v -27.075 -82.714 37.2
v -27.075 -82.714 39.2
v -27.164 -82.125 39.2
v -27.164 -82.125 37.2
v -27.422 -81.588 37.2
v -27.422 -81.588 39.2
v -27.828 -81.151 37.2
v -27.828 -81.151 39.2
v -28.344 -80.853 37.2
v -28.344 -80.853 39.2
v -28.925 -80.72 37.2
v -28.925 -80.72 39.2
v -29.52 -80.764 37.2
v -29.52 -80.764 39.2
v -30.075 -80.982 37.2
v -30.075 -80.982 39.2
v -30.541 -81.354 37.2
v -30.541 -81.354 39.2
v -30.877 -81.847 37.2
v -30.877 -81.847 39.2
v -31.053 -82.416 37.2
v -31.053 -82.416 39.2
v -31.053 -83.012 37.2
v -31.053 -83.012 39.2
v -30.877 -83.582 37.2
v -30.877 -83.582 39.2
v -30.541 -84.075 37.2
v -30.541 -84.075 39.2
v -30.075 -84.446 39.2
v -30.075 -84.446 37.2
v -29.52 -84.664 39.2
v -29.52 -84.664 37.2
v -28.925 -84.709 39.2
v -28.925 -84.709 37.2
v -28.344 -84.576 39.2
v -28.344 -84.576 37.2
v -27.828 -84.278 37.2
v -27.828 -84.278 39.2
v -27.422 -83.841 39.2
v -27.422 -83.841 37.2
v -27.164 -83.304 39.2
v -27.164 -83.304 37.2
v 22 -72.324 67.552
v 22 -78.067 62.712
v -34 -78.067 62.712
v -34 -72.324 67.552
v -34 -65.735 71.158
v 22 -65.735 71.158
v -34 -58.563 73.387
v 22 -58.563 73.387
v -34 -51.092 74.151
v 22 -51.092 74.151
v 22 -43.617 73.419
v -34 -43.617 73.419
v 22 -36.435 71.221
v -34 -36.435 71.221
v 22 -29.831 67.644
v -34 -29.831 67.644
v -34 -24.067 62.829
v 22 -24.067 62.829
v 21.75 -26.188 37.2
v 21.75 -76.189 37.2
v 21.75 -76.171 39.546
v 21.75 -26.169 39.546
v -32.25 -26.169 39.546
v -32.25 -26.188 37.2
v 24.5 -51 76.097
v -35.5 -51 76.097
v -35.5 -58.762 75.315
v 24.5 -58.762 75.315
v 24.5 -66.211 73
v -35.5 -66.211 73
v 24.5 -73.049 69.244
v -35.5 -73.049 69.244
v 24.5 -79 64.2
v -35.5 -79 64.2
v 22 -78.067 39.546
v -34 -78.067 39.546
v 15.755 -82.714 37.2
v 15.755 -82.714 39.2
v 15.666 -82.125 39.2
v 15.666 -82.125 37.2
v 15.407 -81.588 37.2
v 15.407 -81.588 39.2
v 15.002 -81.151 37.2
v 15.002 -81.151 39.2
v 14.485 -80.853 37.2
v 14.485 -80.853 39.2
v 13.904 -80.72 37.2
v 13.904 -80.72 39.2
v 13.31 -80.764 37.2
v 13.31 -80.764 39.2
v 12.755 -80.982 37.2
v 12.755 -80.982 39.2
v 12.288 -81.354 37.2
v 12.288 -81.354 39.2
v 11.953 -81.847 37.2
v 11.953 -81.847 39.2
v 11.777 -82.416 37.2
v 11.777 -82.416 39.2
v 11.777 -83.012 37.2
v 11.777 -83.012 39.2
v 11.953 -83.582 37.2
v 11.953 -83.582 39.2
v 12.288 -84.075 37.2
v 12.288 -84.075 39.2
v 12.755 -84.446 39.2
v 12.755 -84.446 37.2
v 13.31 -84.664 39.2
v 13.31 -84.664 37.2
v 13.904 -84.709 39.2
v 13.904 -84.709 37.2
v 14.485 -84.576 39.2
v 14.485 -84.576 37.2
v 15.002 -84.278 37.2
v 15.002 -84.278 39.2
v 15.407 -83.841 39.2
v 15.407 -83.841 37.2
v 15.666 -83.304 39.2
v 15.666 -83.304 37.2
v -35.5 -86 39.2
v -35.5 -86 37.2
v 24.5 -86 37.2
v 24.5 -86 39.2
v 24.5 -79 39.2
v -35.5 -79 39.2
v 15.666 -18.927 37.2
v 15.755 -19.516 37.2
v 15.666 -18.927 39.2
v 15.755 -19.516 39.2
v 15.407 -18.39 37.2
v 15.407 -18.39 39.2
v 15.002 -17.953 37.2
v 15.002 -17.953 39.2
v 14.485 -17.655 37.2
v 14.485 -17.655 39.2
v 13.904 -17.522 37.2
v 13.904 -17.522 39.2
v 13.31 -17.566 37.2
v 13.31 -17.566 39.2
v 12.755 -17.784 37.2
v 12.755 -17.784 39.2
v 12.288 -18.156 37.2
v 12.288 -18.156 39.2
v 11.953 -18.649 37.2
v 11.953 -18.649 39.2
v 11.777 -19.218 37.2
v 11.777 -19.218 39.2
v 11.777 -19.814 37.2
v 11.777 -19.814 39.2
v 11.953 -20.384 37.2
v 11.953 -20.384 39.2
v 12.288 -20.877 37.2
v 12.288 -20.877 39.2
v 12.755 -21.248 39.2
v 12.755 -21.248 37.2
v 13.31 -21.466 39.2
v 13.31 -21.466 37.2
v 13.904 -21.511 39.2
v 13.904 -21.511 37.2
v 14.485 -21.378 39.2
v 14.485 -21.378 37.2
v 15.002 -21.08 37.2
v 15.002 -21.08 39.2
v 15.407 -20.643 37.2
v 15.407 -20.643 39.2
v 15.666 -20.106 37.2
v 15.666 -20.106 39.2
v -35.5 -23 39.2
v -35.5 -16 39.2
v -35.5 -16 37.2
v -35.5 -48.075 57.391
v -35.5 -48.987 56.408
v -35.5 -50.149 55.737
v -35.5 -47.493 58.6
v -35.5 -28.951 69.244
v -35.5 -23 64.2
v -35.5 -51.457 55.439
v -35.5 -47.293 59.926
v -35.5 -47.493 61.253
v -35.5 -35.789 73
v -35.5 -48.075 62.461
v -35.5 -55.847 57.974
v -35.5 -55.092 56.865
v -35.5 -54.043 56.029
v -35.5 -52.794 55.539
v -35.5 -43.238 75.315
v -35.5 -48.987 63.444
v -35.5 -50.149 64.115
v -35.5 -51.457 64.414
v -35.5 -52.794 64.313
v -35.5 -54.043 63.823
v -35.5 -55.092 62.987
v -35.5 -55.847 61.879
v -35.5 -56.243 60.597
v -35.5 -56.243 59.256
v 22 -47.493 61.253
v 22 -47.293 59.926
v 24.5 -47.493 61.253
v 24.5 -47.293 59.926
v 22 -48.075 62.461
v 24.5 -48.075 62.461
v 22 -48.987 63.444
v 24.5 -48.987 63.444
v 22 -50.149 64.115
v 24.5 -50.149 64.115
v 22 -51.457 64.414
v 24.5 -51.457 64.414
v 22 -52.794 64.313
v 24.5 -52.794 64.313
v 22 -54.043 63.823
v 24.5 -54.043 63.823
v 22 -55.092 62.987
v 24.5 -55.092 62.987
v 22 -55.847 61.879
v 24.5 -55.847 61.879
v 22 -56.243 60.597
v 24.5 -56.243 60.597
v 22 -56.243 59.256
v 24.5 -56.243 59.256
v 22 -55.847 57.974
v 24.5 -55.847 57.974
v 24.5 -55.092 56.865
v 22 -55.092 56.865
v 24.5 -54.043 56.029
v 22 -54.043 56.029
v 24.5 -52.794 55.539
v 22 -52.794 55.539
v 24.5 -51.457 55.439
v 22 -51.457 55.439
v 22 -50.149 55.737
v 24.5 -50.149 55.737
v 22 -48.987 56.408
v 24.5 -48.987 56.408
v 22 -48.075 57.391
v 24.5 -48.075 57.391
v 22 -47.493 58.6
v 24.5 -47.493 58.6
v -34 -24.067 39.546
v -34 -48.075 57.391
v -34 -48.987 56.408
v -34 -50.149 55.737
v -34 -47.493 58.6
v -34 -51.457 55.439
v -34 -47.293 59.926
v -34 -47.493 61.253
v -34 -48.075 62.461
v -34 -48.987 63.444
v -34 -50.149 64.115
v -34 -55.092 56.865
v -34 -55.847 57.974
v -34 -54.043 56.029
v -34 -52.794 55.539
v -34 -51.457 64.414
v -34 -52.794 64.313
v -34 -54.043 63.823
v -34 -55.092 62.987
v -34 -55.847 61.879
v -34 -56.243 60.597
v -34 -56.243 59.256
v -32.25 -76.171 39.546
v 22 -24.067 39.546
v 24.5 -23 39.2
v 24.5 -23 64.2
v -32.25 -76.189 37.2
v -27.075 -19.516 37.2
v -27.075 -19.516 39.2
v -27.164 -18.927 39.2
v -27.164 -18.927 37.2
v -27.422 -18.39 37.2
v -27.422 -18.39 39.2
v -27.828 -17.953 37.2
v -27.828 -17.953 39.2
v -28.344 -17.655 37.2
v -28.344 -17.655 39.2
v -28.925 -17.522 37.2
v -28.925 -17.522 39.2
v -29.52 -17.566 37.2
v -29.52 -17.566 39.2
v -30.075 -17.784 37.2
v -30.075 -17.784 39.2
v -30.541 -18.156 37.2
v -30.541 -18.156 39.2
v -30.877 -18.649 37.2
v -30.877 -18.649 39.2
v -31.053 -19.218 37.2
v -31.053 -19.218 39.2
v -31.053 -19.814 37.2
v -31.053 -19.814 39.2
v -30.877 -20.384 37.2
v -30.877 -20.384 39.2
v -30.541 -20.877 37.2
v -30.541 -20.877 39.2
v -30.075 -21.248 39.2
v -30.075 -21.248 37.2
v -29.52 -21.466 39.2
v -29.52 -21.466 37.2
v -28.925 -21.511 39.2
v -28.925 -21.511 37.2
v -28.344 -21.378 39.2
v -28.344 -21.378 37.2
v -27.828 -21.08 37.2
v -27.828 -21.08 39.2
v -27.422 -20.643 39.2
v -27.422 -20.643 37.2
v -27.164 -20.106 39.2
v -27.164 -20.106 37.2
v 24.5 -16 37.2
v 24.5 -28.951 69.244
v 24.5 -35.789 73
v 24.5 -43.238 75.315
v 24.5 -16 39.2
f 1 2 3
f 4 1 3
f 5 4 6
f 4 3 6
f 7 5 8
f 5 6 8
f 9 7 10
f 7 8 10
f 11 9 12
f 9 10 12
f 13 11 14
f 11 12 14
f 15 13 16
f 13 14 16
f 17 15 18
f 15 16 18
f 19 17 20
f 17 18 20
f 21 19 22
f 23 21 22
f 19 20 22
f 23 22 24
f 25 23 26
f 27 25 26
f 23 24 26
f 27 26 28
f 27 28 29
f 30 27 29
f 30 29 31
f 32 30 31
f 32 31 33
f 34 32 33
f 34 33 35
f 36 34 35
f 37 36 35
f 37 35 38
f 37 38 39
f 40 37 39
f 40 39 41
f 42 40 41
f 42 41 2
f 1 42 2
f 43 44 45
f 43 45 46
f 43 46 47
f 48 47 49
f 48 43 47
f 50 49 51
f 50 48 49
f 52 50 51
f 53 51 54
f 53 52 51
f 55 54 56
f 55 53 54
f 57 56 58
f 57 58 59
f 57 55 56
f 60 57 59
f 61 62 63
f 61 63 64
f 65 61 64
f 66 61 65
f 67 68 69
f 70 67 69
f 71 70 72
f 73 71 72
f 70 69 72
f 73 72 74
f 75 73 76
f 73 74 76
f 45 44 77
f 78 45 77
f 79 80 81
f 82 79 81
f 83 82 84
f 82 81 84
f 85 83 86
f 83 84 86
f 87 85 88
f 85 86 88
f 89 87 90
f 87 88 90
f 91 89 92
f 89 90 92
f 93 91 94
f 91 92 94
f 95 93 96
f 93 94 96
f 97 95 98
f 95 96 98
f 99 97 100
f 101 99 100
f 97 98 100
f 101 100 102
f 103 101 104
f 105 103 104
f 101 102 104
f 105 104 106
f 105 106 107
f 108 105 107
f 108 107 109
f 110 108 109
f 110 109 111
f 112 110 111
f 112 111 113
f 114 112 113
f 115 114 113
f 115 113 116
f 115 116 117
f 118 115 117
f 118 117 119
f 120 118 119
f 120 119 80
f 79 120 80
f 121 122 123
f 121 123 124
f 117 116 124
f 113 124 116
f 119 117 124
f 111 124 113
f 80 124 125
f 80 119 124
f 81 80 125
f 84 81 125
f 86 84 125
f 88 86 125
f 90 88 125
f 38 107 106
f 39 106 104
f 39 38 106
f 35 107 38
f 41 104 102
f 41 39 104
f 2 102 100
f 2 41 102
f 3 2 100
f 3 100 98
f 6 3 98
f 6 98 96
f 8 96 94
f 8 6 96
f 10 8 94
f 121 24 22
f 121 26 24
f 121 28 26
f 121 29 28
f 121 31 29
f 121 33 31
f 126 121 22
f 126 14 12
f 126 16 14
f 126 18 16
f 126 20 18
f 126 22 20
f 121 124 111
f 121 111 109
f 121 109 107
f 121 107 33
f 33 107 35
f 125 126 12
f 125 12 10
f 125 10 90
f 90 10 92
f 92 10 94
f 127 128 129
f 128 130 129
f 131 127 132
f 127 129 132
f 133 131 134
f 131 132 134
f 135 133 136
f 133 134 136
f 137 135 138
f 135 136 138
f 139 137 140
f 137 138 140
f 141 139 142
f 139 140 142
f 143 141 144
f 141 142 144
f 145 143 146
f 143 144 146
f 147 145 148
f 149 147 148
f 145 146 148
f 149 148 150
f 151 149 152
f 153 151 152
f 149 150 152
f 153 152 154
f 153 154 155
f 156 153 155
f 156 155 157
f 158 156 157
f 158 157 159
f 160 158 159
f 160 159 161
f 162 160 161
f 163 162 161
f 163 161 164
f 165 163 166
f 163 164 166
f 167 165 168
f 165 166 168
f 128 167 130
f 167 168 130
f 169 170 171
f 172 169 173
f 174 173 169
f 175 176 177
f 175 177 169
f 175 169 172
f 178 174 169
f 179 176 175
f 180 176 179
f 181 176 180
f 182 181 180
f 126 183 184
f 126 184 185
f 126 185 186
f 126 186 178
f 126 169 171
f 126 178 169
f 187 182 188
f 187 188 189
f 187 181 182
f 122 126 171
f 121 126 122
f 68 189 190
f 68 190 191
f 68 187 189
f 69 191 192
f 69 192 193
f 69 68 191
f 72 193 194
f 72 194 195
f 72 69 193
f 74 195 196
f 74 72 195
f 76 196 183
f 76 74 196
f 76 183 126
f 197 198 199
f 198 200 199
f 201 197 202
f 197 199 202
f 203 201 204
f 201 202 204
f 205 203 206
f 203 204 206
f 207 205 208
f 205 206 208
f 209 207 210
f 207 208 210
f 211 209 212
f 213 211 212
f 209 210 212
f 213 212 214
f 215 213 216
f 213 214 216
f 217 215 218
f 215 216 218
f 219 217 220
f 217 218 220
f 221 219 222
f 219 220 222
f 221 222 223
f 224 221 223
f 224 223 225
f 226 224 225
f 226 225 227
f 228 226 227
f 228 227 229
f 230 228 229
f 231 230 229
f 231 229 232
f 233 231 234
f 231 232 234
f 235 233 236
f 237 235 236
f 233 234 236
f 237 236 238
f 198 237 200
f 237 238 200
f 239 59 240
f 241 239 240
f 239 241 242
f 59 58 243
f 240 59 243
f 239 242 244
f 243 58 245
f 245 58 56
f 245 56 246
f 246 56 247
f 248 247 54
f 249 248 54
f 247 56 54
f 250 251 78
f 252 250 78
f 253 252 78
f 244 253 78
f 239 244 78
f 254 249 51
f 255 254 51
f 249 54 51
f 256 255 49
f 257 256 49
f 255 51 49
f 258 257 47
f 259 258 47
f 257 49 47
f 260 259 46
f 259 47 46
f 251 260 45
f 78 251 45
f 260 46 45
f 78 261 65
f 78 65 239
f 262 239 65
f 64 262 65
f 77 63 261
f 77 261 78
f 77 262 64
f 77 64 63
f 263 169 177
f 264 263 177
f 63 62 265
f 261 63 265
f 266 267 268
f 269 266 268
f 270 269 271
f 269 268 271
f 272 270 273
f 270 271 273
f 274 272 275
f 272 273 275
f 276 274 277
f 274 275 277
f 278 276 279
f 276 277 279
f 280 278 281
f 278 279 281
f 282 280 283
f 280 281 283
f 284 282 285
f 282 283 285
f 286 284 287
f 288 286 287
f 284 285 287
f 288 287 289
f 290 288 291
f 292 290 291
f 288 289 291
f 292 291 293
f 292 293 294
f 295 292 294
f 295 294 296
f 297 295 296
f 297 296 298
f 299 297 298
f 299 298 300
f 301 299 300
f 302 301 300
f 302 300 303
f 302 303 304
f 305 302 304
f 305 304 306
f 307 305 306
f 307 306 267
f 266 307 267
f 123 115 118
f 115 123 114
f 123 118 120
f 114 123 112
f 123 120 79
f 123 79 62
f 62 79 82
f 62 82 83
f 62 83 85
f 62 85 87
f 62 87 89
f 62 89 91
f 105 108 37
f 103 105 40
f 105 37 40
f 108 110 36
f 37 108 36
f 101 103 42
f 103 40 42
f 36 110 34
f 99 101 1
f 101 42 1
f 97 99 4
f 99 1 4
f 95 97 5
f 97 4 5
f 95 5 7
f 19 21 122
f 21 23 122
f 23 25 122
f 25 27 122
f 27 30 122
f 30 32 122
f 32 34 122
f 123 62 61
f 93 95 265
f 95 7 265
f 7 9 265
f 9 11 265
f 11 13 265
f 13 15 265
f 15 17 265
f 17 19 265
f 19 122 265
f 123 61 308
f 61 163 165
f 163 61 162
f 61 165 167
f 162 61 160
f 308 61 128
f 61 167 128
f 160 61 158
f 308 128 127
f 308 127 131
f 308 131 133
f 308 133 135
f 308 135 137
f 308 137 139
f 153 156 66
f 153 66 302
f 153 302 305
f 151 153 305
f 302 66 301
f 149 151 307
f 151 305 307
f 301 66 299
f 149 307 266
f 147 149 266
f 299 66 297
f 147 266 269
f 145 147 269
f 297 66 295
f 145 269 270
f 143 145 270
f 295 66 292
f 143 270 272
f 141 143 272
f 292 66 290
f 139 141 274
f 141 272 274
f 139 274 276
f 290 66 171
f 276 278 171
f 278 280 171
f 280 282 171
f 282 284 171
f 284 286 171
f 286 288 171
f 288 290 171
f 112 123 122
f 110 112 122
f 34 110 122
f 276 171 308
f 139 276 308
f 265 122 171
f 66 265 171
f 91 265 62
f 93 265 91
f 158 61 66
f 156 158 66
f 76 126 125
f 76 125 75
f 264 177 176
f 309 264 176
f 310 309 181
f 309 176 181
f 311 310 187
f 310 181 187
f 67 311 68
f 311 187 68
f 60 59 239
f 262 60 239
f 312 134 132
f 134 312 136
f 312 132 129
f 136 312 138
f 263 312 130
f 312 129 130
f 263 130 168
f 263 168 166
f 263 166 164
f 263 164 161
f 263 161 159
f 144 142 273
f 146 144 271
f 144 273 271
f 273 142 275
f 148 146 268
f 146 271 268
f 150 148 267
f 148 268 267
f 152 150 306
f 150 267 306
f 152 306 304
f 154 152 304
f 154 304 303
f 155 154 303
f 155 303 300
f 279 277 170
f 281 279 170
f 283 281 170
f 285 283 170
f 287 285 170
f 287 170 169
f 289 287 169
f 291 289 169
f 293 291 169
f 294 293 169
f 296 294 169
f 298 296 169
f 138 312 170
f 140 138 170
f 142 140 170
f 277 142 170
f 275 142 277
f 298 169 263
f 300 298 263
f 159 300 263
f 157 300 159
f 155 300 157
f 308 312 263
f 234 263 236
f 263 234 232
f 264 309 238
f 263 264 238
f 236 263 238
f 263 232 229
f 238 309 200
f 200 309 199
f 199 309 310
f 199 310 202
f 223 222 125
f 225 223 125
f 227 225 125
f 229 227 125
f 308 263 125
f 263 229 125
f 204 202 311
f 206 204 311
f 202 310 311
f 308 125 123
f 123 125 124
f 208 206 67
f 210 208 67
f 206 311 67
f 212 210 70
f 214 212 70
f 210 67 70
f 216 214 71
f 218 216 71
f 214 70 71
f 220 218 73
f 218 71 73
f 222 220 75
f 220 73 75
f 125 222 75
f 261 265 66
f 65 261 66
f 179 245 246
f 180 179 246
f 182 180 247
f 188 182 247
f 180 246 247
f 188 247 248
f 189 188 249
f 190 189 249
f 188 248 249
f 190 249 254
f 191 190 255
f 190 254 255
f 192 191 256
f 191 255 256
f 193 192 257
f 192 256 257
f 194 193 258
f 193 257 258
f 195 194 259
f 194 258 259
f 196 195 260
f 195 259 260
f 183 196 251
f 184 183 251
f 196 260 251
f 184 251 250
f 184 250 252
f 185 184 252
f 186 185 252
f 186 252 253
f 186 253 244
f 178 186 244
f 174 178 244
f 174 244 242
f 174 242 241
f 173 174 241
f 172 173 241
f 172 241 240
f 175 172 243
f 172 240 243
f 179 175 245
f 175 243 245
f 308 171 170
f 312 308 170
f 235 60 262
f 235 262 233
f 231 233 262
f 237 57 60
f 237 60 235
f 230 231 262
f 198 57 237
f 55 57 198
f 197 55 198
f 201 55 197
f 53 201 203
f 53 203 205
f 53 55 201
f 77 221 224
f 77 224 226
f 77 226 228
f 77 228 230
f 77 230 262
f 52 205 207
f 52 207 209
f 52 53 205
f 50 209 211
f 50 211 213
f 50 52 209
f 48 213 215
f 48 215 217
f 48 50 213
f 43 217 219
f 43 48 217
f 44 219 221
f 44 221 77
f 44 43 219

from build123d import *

# Parameters (mm, degrees)
EXTRUDE051_DEPTH                          = 56
SKETCH049_R                               = 2
EXTRUDE049_DEPTH                          = 15
SKETCH048_R                               = 4.5
EXTRUDE048_DEPTH                          = 100
SKETCH046_AS_DRAWN_W                      = 50
SKETCH046_AS_DRAWN_H                      = 54
EXTRUDE046_DEPTH                          = 24
EXTRUDE046_ONTO_SKETCH046_PITCH_ANGLE     = 0.457086
EXTRUDE046_ONTO_SKETCH046_PLACEMENT_ANGLE = 90
EXTRUDE045_DEPTH                          = 60


with BuildPart() as block_hollower:
    # Sketch050 (on Face1 of Cut026) → Extrude051 (new body)
    with BuildSketch(Plane(origin=(-35.5, 0, 0), x_dir=(0, -1, 0), z_dir=(-1, 0, 0))):
        with BuildLine():
            Line((24.067108, 62.828769), (24.067108, 39.546181))
            Line((24.067108, 39.546181), (78.067085, 39.546181))
            Line((78.067085, 62.712322), (78.067085, 39.546181))
            ThreePointArc((78.067085, 62.712322), (51.091637, 74.150565), (24.067108, 62.828769))
        make_face()
    extrude(amount=EXTRUDE051_DEPTH)


with BuildPart() as block_hollower_1:
    # Extrude051 placement: moved
    add(block_hollower.part.moved(Location((57.5, 0, 0))))


with BuildPart() as weapon_cover_screw_holes:
    # Sketch049 (on Face6 of Cut025) → Extrude049 (new body, symmetric)
    with BuildSketch(Plane.XY.offset(39.2)):
        with Locations((-29.074951, -82.714325)):
            Circle(SKETCH049_R)
        with Locations((13.75458, -82.714325)):
            Circle(SKETCH049_R)
        with Locations((-29.074951, -19.516283)):
            Circle(SKETCH049_R)
        with Locations((13.75458, -19.516283)):
            Circle(SKETCH049_R)
    extrude(amount=EXTRUDE049_DEPTH, both=True)


with BuildPart() as axis_hole_lid:
    # Sketch048 (on Face3 of Cut024) → Extrude048 (new body, symmetric)
    with BuildSketch(Plane.YZ.offset(24.5)):
        with Locations((-51.79294, 59.926255)):
            Circle(SKETCH048_R)
    extrude(amount=EXTRUDE048_DEPTH, both=True)


with BuildPart() as semi_hollower:
    # Sketch046 as drawn → Extrude046 (new)
    with BuildSketch(Plane.XY):
        with Locations((-9, -1)):
            Rectangle(SKETCH046_AS_DRAWN_W, SKETCH046_AS_DRAWN_H)
    extrude(amount=EXTRUDE046_DEPTH)


with BuildPart() as semi_hollower_1:
    # Extrude046 onto Sketch046 pitch: moved
    add(semi_hollower.part.rotate(Axis((0, 0, 0), (0, 1, 0)), EXTRUDE046_ONTO_SKETCH046_PITCH_ANGLE))


with BuildPart() as semi_hollower_2:
    # Extrude046 onto Sketch046 placement: moved
    add(semi_hollower_1.part.moved(Location((-5.5, -69.445946, 37.254054))).rotate(Axis((-5.5, -69.445946, 37.254054), (0, 0, 1)), EXTRUDE046_ONTO_SKETCH046_PLACEMENT_ANGLE))


with BuildPart() as semi_hollower_3:
    # Extrude046 placement: moved
    add(semi_hollower_2.part.moved(Location((-0.75, 27.25, -1))))


with BuildPart() as weapon_gear_cover:
    # Sketch045 → Extrude045 (new body)
    with BuildSketch(Plane.YZ):
        with BuildLine():
            Line((-86, 37.2), (-86, 39.2))
            Line((-86, 39.2), (-79, 39.2))
            Line((-79, 39.2), (-79, 64.2))
            ThreePointArc((-51, 76.097301), (-66.211392, 72.999631), (-79, 64.2))
            ThreePointArc((-23, 64.2), (-35.788608, 72.999631), (-51, 76.097301))
            Line((-23, 39.2), (-23, 64.2))
            Line((-16, 39.2), (-23, 39.2))
            Line((-16, 37.2), (-16, 39.2))
            Line((-16, 37.2), (-51, 37.2))
            Line((-86, 37.2), (-51, 37.2))
        make_face()
    extrude(amount=EXTRUDE045_DEPTH)


with BuildPart() as weapon_gear_cover_1:
    # Extrude045 placement: moved
    add(weapon_gear_cover.part.moved(Location((-35.5, 0, 0))))

    # Cut024: cut Semi Hollower
    add(semi_hollower_3.part, mode=Mode.SUBTRACT)

    # Cut025: cut Axis Hole Lid
    add(axis_hole_lid.part, mode=Mode.SUBTRACT)

    # Cut026: cut Weapon Cover Screw Holes
    add(weapon_cover_screw_holes.part, mode=Mode.SUBTRACT)

    # Cut028: cut Block Hollower
    add(block_hollower_1.part, mode=Mode.SUBTRACT)


solid = weapon_gear_cover_1.part
